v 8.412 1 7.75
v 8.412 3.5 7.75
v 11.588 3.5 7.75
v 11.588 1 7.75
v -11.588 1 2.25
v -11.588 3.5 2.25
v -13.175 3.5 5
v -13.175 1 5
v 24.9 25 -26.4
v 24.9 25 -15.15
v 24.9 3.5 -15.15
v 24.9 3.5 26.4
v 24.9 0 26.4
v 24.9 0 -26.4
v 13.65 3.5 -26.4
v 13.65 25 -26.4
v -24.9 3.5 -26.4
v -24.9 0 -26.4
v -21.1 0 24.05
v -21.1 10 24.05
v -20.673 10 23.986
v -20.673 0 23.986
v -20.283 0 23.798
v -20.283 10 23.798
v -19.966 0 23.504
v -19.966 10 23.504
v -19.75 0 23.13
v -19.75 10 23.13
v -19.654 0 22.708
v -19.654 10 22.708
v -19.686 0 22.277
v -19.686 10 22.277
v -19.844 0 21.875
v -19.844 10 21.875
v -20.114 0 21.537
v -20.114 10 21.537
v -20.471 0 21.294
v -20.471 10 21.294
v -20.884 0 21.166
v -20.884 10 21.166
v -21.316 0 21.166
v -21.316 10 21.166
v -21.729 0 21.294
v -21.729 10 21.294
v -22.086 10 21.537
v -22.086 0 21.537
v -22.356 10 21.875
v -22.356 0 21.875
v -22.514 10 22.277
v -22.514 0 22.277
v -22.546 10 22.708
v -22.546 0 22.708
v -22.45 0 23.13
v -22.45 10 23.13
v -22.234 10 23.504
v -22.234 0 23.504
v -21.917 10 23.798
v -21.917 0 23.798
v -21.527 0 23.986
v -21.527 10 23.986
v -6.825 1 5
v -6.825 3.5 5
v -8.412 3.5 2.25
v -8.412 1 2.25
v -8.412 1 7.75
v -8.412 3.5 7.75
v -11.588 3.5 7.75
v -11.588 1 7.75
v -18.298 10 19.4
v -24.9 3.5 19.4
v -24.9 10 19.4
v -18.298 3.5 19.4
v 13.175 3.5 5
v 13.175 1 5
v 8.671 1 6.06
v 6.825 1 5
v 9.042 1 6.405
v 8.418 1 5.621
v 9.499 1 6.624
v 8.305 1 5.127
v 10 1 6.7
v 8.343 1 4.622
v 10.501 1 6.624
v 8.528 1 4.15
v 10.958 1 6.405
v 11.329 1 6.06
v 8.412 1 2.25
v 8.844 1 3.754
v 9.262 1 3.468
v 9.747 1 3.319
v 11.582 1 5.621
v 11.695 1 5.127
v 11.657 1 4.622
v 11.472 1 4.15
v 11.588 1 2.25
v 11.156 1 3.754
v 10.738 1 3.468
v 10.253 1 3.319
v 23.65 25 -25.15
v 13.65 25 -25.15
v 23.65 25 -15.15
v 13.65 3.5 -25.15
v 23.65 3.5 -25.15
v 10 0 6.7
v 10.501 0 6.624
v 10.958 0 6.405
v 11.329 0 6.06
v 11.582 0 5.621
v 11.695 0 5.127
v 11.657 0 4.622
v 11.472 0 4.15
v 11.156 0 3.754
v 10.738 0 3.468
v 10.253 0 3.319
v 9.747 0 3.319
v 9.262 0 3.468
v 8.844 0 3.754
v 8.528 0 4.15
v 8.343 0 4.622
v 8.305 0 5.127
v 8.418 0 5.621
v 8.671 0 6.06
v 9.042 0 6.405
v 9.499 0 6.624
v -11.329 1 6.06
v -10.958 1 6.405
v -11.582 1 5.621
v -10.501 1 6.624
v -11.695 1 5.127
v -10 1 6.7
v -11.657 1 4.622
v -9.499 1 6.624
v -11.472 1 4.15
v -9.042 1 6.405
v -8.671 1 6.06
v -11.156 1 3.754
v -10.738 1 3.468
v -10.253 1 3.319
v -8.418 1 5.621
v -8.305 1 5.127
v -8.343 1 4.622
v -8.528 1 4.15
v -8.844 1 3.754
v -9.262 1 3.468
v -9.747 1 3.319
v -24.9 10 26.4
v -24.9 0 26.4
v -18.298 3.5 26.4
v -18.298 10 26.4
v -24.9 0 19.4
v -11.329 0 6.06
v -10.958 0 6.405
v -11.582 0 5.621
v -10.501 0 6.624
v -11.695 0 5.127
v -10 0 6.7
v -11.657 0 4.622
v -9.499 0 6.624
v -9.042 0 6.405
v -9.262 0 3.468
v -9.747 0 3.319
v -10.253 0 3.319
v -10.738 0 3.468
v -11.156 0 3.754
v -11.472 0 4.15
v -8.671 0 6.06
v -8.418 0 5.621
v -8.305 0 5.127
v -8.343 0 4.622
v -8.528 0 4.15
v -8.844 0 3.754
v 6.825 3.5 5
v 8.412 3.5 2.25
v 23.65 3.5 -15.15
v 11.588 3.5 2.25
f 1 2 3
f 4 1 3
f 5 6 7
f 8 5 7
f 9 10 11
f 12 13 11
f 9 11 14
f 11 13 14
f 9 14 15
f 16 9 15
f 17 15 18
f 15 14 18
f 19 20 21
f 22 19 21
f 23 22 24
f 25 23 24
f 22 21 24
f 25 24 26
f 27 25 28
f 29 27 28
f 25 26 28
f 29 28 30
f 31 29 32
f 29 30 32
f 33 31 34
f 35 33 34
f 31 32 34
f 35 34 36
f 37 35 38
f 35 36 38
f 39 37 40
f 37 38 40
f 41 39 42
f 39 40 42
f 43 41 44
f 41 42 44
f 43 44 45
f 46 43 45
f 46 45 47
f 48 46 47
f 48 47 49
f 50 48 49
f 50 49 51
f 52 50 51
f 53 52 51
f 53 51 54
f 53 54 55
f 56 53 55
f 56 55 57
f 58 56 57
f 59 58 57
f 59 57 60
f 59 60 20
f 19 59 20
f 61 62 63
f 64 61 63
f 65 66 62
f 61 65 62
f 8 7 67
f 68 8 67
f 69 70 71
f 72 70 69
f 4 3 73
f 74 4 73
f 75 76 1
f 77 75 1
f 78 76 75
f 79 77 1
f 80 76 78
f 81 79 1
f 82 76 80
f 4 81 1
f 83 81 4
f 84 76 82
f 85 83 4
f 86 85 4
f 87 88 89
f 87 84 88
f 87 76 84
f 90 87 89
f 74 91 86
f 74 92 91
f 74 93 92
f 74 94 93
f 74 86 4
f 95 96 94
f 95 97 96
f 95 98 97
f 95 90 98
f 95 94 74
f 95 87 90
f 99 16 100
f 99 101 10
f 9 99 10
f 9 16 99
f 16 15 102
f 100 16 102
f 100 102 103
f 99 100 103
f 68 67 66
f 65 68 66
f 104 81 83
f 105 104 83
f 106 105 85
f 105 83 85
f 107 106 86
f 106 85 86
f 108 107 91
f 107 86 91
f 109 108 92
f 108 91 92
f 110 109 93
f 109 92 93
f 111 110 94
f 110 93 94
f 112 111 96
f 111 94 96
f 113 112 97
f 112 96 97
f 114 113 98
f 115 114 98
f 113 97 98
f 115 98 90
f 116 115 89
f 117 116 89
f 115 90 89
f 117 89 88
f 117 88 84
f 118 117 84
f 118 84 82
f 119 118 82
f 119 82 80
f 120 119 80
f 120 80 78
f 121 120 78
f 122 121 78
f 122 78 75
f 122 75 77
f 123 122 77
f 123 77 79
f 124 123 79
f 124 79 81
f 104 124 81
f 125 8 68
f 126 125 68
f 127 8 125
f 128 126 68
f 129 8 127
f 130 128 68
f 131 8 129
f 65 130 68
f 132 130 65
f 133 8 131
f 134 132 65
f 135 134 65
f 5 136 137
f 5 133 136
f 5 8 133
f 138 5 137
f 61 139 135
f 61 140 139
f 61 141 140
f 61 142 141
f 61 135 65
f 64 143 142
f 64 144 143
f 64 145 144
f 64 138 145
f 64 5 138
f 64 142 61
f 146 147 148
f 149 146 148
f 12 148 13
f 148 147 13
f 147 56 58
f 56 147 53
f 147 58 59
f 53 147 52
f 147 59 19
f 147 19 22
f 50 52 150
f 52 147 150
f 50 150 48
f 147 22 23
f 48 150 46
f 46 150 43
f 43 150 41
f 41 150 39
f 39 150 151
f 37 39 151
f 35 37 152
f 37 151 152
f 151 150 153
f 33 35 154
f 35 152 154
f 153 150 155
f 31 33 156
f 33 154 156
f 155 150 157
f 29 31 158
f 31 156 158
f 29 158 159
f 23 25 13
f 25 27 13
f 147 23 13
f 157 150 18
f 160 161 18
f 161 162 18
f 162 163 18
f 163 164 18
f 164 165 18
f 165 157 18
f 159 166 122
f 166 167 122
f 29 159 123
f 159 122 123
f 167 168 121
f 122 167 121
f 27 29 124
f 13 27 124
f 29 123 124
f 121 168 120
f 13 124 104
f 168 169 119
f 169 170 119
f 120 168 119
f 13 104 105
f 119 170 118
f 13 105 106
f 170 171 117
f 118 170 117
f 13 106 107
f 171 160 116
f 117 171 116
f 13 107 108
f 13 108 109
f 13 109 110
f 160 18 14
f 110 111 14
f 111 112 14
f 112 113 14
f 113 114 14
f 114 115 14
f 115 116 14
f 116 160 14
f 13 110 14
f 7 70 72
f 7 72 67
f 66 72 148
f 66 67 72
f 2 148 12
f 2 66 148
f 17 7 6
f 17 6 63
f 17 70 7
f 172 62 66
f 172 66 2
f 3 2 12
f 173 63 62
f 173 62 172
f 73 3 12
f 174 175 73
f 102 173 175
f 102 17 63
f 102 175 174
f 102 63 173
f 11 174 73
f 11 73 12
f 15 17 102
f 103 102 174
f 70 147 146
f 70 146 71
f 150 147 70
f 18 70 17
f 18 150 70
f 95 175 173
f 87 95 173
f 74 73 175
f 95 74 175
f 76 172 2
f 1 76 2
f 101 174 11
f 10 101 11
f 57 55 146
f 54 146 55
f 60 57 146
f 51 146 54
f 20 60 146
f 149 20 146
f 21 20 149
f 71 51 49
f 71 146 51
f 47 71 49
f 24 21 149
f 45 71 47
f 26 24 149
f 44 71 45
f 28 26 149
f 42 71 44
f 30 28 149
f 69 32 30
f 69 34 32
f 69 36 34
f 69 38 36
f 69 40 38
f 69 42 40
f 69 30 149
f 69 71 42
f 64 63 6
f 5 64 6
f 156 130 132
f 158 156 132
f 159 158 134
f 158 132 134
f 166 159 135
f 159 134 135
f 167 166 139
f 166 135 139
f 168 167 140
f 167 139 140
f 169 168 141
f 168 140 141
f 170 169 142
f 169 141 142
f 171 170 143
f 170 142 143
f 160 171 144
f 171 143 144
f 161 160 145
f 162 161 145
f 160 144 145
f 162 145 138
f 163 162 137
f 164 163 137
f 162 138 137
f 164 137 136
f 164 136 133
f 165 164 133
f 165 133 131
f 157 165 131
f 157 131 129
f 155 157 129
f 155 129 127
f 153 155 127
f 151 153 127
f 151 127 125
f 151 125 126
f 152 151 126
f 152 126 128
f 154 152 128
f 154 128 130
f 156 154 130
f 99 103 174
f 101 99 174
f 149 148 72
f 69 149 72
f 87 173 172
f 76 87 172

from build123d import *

# Parameters (mm, degrees)
BOSS_EXTRUDE1_DEPTH = 3.5
BOSS_EXTRUDE2_DEPTH = 25
SKETCH1_5_W         = 6.602272727
SKETCH1_5_H         = 7
BOSS_EXTRUDE3_DEPTH = 10
SKETCH3_R           = 1.45
CUT_EXTRUDE1_DEPTH  = 40.267925843
SKETCH4_R           = 1.7
CUT_EXTRUDE2_DEPTH  = 43.18080132
SKETCH4_3_R         = 1.7
CUT_EXTRUDE3_DEPTH  = 2.5


with BuildPart() as part:
    # Sketch1 → Boss-Extrude1 (new body)
    with BuildSketch(Plane(origin=(0, 0, 0), x_dir=(1, 0, 0), z_dir=(0, 1, 0))):
        Polygon((13.65, 25.15), (13.65, 26.4), (-24.9, 26.4), (-24.9, -19.4), (-18.297727273, -19.4), (-18.297727273, -26.4), (24.9, -26.4), (24.9, 15.15), (23.65, 15.15), (23.65, 25.15), align=None)
    extrude(amount=BOSS_EXTRUDE1_DEPTH)

    # Sketch1<4> → Boss-Extrude2 (add)
    with BuildSketch(Plane(origin=(0, 0, 0), x_dir=(1, 0, 0), z_dir=(0, 1, 0))):
        Polygon((24.9, 26.4), (13.65, 26.4), (13.65, 25.15), (23.65, 25.15), (23.65, 15.15), (24.9, 15.15), align=None)
    extrude(amount=BOSS_EXTRUDE2_DEPTH)

    # Sketch1<5> → Boss-Extrude3 (add)
    with BuildSketch(Plane(origin=(0, 0, 0), x_dir=(1, 0, 0), z_dir=(0, 1, 0))):
        with Locations((-21.598863636, -22.9)):
            Rectangle(SKETCH1_5_W, SKETCH1_5_H)
    extrude(amount=BOSS_EXTRUDE3_DEPTH)

    # Sketch3 → Cut-Extrude1 (cut, through all)
    with BuildSketch(Plane(origin=(0, 10, 0), x_dir=(1, 0, 0), z_dir=(0, 1, 0))):
        with Locations((-21.1, -22.6)):
            Circle(SKETCH3_R)
    extrude(amount=-CUT_EXTRUDE1_DEPTH, mode=Mode.SUBTRACT)

    # Sketch4 → Cut-Extrude2 (cut, through all)
    with BuildSketch(Plane(origin=(0, 3.5, 0), x_dir=(1, 0, 0), z_dir=(0, 1, 0))):
        with Locations((-10, -5)):
            Circle(SKETCH4_R)
        with Locations((10, -5)):
            Circle(SKETCH4_R)
    extrude(amount=-CUT_EXTRUDE2_DEPTH, mode=Mode.SUBTRACT)

    # Sketch4<3> → Cut-Extrude3 (cut)
    # profile 1 of 2: a face of its own
    with BuildSketch(Plane(origin=(0, 3.5, 0), x_dir=(1, 0, 0), z_dir=(0, 1, 0))):
        Polygon((-6.824573519, -5), (-8.41228676, -2.25), (-11.58771324, -2.25), (-13.175426481, -5), (-11.58771324, -7.75), (-8.41228676, -7.75), align=None)
        with Locations((-10, -5)):
            Circle(SKETCH4_3_R, mode=Mode.SUBTRACT)
    # profile 2 of 2: a face of its own
    with BuildSketch(Plane(origin=(0, 3.5, 0), x_dir=(1, 0, 0), z_dir=(0, 1, 0))):
        Polygon((13.175426481, -5), (11.58771324, -2.25), (8.41228676, -2.25), (6.824573519, -5), (8.41228676, -7.75), (11.58771324, -7.75), align=None)
        with Locations((10, -5)):
            Circle(SKETCH4_3_R, mode=Mode.SUBTRACT)
    extrude(amount=-CUT_EXTRUDE3_DEPTH, mode=Mode.SUBTRACT)


solid = part.part
